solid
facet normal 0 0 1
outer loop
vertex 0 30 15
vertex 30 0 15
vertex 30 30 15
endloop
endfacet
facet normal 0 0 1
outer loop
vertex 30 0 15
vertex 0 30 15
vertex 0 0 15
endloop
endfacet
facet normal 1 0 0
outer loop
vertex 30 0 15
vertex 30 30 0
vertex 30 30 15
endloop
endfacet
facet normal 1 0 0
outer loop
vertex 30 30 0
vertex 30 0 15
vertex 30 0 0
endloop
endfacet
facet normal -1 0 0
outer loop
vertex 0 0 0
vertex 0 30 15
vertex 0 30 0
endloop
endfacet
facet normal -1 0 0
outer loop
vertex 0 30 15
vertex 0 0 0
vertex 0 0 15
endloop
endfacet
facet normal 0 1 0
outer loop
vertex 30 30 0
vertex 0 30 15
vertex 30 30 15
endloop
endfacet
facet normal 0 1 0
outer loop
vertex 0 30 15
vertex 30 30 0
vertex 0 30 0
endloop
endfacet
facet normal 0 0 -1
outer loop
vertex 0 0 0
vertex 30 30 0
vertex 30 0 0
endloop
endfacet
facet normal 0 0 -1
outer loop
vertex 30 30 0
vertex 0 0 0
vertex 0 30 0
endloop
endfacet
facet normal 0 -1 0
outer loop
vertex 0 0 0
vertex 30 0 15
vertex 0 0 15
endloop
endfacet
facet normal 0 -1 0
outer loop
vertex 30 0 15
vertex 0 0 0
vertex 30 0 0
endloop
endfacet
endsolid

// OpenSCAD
// Generated by generate_scads.py
difference() {
  cube(size=[30,30,15], center=false);
  difference() {
    sphere(r=10);
    cylinder(h=15, r=6, center=false);
    cube(size=[10,30,20], center=true);
    cylinder(h=25, r=12, center=true);
  }
}
